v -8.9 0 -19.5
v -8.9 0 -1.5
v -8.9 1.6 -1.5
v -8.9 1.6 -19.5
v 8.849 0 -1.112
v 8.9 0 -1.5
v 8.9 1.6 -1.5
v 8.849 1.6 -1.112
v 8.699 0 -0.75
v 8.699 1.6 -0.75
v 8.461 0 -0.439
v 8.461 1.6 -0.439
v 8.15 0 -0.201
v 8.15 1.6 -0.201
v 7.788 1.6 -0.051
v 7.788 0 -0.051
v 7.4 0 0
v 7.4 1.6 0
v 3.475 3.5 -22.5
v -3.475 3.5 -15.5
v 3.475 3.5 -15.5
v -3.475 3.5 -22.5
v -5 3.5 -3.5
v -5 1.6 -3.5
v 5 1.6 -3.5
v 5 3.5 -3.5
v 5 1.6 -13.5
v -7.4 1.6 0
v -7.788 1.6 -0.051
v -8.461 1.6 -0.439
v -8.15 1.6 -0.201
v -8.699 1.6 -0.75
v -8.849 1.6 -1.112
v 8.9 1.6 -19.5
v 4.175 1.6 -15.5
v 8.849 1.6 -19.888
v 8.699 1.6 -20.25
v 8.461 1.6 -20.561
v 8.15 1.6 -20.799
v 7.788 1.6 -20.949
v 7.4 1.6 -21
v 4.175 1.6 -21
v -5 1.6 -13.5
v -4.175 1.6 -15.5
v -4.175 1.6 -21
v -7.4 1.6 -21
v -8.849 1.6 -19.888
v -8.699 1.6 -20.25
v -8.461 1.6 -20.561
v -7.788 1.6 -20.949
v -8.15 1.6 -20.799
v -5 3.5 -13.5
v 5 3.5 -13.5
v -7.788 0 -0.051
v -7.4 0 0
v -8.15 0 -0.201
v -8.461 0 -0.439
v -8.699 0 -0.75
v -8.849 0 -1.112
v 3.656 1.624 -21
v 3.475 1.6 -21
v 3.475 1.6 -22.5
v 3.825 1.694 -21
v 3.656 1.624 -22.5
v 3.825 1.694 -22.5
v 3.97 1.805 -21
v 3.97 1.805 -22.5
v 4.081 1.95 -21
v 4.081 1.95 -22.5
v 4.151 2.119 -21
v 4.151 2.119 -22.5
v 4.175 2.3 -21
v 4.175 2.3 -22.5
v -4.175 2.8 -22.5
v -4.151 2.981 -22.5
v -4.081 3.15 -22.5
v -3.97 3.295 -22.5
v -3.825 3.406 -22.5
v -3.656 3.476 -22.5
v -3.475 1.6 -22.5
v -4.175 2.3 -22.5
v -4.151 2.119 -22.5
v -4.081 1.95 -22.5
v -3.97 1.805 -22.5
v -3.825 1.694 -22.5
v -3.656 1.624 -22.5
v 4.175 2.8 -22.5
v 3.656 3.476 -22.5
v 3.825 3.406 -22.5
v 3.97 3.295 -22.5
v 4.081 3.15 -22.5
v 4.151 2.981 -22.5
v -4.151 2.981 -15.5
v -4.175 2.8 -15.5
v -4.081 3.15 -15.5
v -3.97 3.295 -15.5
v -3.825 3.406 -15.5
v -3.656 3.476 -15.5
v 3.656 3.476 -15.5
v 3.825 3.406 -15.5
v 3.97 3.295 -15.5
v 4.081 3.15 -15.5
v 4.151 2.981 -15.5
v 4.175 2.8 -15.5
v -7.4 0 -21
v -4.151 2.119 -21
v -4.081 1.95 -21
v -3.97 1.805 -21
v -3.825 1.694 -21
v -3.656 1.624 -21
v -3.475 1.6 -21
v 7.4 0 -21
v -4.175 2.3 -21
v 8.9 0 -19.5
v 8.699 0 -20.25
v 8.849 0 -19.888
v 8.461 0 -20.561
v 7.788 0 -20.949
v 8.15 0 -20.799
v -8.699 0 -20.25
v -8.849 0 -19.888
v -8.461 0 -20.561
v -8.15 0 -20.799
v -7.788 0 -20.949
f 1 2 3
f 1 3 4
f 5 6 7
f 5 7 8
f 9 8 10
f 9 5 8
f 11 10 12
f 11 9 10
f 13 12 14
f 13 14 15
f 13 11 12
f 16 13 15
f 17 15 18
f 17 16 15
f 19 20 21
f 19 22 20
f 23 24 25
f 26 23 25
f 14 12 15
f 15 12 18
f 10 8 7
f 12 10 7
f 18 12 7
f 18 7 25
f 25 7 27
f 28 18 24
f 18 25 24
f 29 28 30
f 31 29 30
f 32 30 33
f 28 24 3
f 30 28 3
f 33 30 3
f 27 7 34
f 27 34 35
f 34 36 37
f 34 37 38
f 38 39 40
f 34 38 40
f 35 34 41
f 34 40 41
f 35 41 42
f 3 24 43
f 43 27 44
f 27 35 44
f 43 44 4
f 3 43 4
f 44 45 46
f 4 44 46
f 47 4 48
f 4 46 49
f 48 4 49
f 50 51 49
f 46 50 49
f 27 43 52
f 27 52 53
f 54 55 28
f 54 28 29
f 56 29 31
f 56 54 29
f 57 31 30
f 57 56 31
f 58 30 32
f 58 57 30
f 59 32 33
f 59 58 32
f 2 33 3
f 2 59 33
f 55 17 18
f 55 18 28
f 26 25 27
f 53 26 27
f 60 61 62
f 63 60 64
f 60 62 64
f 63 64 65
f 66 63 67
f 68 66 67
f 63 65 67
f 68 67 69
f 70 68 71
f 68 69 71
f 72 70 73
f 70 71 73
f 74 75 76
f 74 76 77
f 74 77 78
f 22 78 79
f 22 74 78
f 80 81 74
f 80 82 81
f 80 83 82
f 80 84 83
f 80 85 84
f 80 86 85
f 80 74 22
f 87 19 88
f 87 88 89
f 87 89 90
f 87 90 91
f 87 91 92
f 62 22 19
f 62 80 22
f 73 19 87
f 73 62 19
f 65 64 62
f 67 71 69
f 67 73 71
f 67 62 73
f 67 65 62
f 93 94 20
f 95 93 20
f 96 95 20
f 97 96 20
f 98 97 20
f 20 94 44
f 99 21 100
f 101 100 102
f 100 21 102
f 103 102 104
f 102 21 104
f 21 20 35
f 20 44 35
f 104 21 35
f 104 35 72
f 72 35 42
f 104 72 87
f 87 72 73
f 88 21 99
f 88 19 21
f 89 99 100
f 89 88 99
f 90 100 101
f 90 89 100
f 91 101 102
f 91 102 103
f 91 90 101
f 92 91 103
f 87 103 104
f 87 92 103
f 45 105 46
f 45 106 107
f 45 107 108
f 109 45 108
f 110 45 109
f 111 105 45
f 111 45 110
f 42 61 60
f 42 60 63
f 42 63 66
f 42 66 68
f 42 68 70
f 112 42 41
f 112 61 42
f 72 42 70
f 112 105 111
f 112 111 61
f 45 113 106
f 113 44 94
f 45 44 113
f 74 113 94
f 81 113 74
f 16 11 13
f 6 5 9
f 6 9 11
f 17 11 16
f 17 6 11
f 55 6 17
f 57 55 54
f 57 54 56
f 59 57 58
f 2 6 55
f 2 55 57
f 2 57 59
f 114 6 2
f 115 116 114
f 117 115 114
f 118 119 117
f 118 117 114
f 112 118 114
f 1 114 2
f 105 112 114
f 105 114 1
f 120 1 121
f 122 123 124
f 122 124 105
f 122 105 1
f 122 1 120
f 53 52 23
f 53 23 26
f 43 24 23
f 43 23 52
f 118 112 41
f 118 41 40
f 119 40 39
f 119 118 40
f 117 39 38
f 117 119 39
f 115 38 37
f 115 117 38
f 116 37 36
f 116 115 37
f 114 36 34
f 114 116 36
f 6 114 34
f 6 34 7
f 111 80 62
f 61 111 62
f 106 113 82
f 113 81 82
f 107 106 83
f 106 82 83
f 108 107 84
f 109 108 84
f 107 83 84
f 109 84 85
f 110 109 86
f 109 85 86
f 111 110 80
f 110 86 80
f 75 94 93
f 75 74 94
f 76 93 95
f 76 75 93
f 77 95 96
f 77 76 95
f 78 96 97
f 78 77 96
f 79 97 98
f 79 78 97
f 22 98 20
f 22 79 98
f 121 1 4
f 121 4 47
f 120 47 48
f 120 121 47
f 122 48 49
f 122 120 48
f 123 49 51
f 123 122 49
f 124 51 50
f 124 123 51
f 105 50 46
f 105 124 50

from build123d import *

# Parameters (mm, degrees)
BOSS_EXTRUDE1_DEPTH = 1.6
SKETCH2_W           = 8.35
SKETCH2_H           = 7
SKETCH2_W_2         = 10
SKETCH2_H_2         = 10
BOSS_EXTRUDE2_DEPTH = 1.9
FILLET1_R           = 0.7


with BuildPart() as part:
    # Sketch1 → Boss-Extrude1 (new body)
    with BuildSketch(Plane(origin=(0, 0, 0), x_dir=(1, 0, 0), z_dir=(0, 1, 0))):
        with BuildLine():
            Line((7.4, 0), (-7.4, 0))
            ThreePointArc((-7.4, 0), (-8.460660172, 0.439339828), (-8.9, 1.5))
            Line((-8.9, 1.5), (-8.9, 19.5))
            ThreePointArc((-8.9, 19.5), (-8.460660172, 20.560660172), (-7.4, 21))
            Line((-7.4, 21), (7.4, 21))
            ThreePointArc((7.4, 21), (8.460660172, 20.560660172), (8.9, 19.5))
            Line((8.9, 19.5), (8.9, 1.5))
            ThreePointArc((8.9, 1.5), (8.460660172, 0.439339828), (7.4, 0))
        make_face()
    extrude(amount=BOSS_EXTRUDE1_DEPTH)

    # Sketch2 → Boss-Extrude2 (add)
    with BuildSketch(Plane(origin=(0, 1.6, 0), x_dir=(1, 0, 0), z_dir=(0, 1, 0))):
        with Locations((0, 19)):
            Rectangle(SKETCH2_W, SKETCH2_H)
        with Locations((0, 8.5)):
            Rectangle(SKETCH2_W_2, SKETCH2_H_2)
    extrude(amount=BOSS_EXTRUDE2_DEPTH)

    # Fillet1
    fillet1_edges = [part.edges().sort_by_distance(p)[0] for p in [
        (-4.175, 1.6, -21.75),
        (4.175, 1.6, -21.75),
        (-4.175, 3.5, -19),
        (4.175, 3.5, -19),
    ]]
    fillet(fillet1_edges, radius=FILLET1_R)


solid = part.part
